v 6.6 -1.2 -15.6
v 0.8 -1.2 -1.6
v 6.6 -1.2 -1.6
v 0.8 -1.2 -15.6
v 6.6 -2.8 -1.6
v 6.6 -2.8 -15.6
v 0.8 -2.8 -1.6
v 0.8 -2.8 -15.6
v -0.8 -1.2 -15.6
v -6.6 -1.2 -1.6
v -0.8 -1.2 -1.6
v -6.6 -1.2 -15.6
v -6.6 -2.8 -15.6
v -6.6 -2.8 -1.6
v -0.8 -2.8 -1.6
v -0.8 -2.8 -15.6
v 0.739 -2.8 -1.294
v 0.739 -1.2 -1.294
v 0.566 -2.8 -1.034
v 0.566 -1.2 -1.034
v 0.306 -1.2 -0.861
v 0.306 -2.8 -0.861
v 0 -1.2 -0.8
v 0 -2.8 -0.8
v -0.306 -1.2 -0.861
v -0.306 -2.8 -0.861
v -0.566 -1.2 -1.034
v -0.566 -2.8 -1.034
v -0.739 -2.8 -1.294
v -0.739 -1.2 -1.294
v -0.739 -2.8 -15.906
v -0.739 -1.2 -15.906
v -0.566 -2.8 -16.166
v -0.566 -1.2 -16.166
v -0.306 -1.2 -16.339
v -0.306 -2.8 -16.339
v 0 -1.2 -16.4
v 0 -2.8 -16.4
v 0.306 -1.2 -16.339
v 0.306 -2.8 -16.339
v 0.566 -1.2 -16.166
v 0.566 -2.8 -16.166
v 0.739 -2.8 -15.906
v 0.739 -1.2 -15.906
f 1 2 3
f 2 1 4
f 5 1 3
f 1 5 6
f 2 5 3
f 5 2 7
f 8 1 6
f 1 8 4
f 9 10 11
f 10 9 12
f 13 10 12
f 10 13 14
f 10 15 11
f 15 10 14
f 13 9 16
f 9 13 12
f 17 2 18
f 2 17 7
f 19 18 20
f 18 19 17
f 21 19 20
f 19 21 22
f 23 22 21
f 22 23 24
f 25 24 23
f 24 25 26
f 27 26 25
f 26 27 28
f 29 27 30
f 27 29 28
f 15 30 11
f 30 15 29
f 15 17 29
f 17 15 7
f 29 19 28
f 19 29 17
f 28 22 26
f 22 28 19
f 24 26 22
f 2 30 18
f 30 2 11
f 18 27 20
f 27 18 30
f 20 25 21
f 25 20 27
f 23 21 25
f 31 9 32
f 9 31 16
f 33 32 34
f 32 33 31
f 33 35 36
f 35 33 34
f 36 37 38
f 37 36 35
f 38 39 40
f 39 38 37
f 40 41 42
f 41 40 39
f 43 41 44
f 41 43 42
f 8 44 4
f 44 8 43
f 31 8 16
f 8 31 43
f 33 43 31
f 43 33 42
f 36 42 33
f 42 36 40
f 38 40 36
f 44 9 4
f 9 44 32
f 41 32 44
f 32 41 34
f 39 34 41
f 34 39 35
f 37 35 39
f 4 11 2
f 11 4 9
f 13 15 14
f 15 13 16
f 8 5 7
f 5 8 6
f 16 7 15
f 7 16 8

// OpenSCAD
// file: ../p/4-4edge.scad
use <../lib.scad>
$fa=1; $fs=0.2;
function ldraw_lib__4_4edge(realsolid=false) = [
// 0 Circle 1.0
// 0 Name: 4-4edge.dat
// 0 Author: James Jessiman
// 0 !LDRAW_ORG Primitive UPDATE 2017-01
// 0 !LICENSE Licensed under CC BY 2.0 and CC BY 4.0 : see CAreadme.txt
// 
// 0 BFC CERTIFY CCW
  [0,"BFC","CERTIFY"],
  [0,"BFC","CCW"],
// 
// 0 !HISTORY 1998-12-15 [PTadmin] Official Update 1998-10
// 0 !HISTORY 2005-12-28 [PTadmin] Official Update 2005-01
// 0 !HISTORY 2007-06-24 [PTadmin] Header formatted for Contributor Agreement
// 0 !HISTORY 2008-07-01 [PTadmin] Official Update 2008-01
// 0 !HISTORY 2017-01-15 [Steffen] BFCed
// 0 !HISTORY 2017-12-30 [PTadmin] Official Update 2017-01
// 
// 
// 2 24 1 0 0 0.9239 0 0.3827
  [2,24,1,0,0,0.9239,0,0.3827],
// 2 24 0.9239 0 0.3827 0.7071 0 0.7071
  [2,24,0.9239,0,0.3827,0.7071,0,0.7071],
// 2 24 0.7071 0 0.7071 0.3827 0 0.9239
  [2,24,0.7071,0,0.7071,0.3827,0,0.9239],
// 2 24 0.3827 0 0.9239 0 0 1
  [2,24,0.3827,0,0.9239,0,0,1],
// 2 24 0 0 1 -0.3827 0 0.9239
  [2,24,0,0,1,-0.3827,0,0.9239],
// 2 24 -0.3827 0 0.9239 -0.7071 0 0.7071
  [2,24,-0.3827,0,0.9239,-0.7071,0,0.7071],
// 2 24 -0.7071 0 0.7071 -0.9239 0 0.3827
  [2,24,-0.7071,0,0.7071,-0.9239,0,0.3827],
// 2 24 -0.9239 0 0.3827 -1 0 -0
  [2,24,-0.9239,0,0.3827,-1,0,-0],
// 2 24 -1 0 -0 -0.9239 0 -0.3827
  [2,24,-1,0,-0,-0.9239,0,-0.3827],
// 2 24 -0.9239 0 -0.3827 -0.7071 0 -0.7071
  [2,24,-0.9239,0,-0.3827,-0.7071,0,-0.7071],
// 2 24 -0.7071 0 -0.7071 -0.3827 0 -0.9239
  [2,24,-0.7071,0,-0.7071,-0.3827,0,-0.9239],
// 2 24 -0.3827 0 -0.9239 0 0 -1
  [2,24,-0.3827,0,-0.9239,0,0,-1],
// 2 24 0 0 -1 0.3827 0 -0.9239
  [2,24,0,0,-1,0.3827,0,-0.9239],
// 2 24 0.3827 0 -0.9239 0.7071 0 -0.7071
  [2,24,0.3827,0,-0.9239,0.7071,0,-0.7071],
// 2 24 0.7071 0 -0.7071 0.9239 0 -0.3827
  [2,24,0.7071,0,-0.7071,0.9239,0,-0.3827],
// 2 24 0.9239 0 -0.3827 1 0 0
  [2,24,0.9239,0,-0.3827,1,0,0],
];
module ldraw_lib__4_4edge(step=0, col=false, unit=2/5, alt=false, line=0.2, solid=!$preview)
    makepoly(ldraw_lib__4_4edge(solid), step=step, col=col, unit=unit, alt=alt, line=line, solid=solid);
ldraw_lib__4_4edge(line=0.2);
// file: ../p/4-4disc.scad
use <../lib.scad>
$fa=1; $fs=0.2;
function ldraw_lib__4_4disc(realsolid=false) = [
// 0 Disc 1.0
// 0 Name: 4-4disc.dat
// 0 Author: James Jessiman
// 0 !LDRAW_ORG Primitive UPDATE 2002-02
// 0 !LICENSE Licensed under CC BY 2.0 and CC BY 4.0 : see CAreadme.txt
// 
// 0 BFC CERTIFY CCW
  [0,"BFC","CERTIFY"],
  [0,"BFC","CCW"],
// 
// 0 !HISTORY 1998-12-15 [PTadmin] Official Update 1998-10
// 0 !HISTORY 2002-03-23 [sbliss] Added BFC statement
// 0 !HISTORY 2002-04-25 [PTadmin] Official Update 2002-02
// 0 !HISTORY 2007-06-24 [PTadmin] Header formatted for Contributor Agreement
// 0 !HISTORY 2008-07-01 [PTadmin] Official Update 2008-01
// 
// 
// 3 16 0 0 0 1 0 0 0.9239 0 0.3827
  [3,16,0,0,0,1,0,0,0.9239,0,0.3827],
// 3 16 0 0 0 0.9239 0 0.3827 0.7071 0 0.7071
  [3,16,0,0,0,0.9239,0,0.3827,0.7071,0,0.7071],
// 3 16 0 0 0 0.7071 0 0.7071 0.3827 0 0.9239
  [3,16,0,0,0,0.7071,0,0.7071,0.3827,0,0.9239],
// 3 16 0 0 0 0.3827 0 0.9239 0 0 1
  [3,16,0,0,0,0.3827,0,0.9239,0,0,1],
// 3 16 0 0 0 0 0 1 -0.3827 0 0.9239
  [3,16,0,0,0,0,0,1,-0.3827,0,0.9239],
// 3 16 0 0 0 -0.3827 0 0.9239 -0.7071 0 0.7071
  [3,16,0,0,0,-0.3827,0,0.9239,-0.7071,0,0.7071],
// 3 16 0 0 0 -0.7071 0 0.7071 -0.9239 0 0.3827
  [3,16,0,0,0,-0.7071,0,0.7071,-0.9239,0,0.3827],
// 3 16 0 0 0 -0.9239 0 0.3827 -1 0 -0
  [3,16,0,0,0,-0.9239,0,0.3827,-1,0,-0],
// 3 16 0 0 0 -1 0 -0 -0.9239 0 -0.3827
  [3,16,0,0,0,-1,0,-0,-0.9239,0,-0.3827],
// 3 16 0 0 0 -0.9239 0 -0.3827 -0.7071 0 -0.7071
  [3,16,0,0,0,-0.9239,0,-0.3827,-0.7071,0,-0.7071],
// 3 16 0 0 0 -0.7071 0 -0.7071 -0.3827 0 -0.9239
  [3,16,0,0,0,-0.7071,0,-0.7071,-0.3827,0,-0.9239],
// 3 16 0 0 0 -0.3827 0 -0.9239 0 0 -1
  [3,16,0,0,0,-0.3827,0,-0.9239,0,0,-1],
// 3 16 0 0 0 0 0 -1 0.3827 0 -0.9239
  [3,16,0,0,0,0,0,-1,0.3827,0,-0.9239],
// 3 16 0 0 0 0.3827 0 -0.9239 0.7071 0 -0.7071
  [3,16,0,0,0,0.3827,0,-0.9239,0.7071,0,-0.7071],
// 3 16 0 0 0 0.7071 0 -0.7071 0.9239 0 -0.3827
  [3,16,0,0,0,0.7071,0,-0.7071,0.9239,0,-0.3827],
// 3 16 0 0 0 0.9239 0 -0.3827 1 0 0
  [3,16,0,0,0,0.9239,0,-0.3827,1,0,0],
// 0
];
module ldraw_lib__4_4disc(step=0, col=false, unit=2/5, alt=false, line=0.2, solid=!$preview)
    makepoly(ldraw_lib__4_4disc(solid), step=step, col=col, unit=unit, alt=alt, line=line, solid=solid);
ldraw_lib__4_4disc(line=0.2);
// file: ../p/4-4cyli.scad
use <../lib.scad>
$fa=1; $fs=0.2;
function ldraw_lib__4_4cyli(realsolid=false) = [
// 0 Cylinder 1.0
// 0 Name: 4-4cyli.dat
// 0 Author: James Jessiman
// 0 !LDRAW_ORG Primitive UPDATE 2005-01
// 0 !LICENSE Licensed under CC BY 2.0 and CC BY 4.0 : see CAreadme.txt
// 
// 0 BFC CERTIFY CCW
  [0,"BFC","CERTIFY"],
  [0,"BFC","CCW"],
// 
// 0 !HISTORY 1998-12-15 [PTadmin] Official Update 1998-10
// 0 !HISTORY 2002-03-23 [sbliss] Added BFC statement; merged headers from files in distributions LDraw 0.27 and Complete.
// 0 !HISTORY 2002-04-25 [PTadmin] Official Update 2002-02
// 0 !HISTORY 2004-12-14 [guyvivan] BFC CCW
// 0 !HISTORY 2005-12-28 [PTadmin] Official Update 2005-01
// 0 !HISTORY 2007-06-24 [PTadmin] Header formatted for Contributor Agreement
// 0 !HISTORY 2008-07-01 [PTadmin] Official Update 2008-01
// 
// 
// 4 16 1 1 0 0.9239 1 0.3827 0.9239 0 0.3827 1 0 0
  [4,16,1,1,0,0.9239,1,0.3827,0.9239,0,0.3827,1,0,0],
// 5 24 1 0 0 1 1 0 0.9239 0 0.3827 0.9239 0 -0.3827
  [5,24,1,0,0,1,1,0,0.9239,0,0.3827,0.9239,0,-0.3827],
// 4 16 0.9239 1 0.3827 0.7071 1 0.7071 0.7071 0 0.7071 0.9239 0 0.3827
  [4,16,0.9239,1,0.3827,0.7071,1,0.7071,0.7071,0,0.7071,0.9239,0,0.3827],
// 5 24 0.9239 0 0.3827 0.9239 1 0.3827 0.7071 0 0.7071 1 0 0
  [5,24,0.9239,0,0.3827,0.9239,1,0.3827,0.7071,0,0.7071,1,0,0],
// 4 16 0.7071 1 0.7071 0.3827 1 0.9239 0.3827 0 0.9239 0.7071 0 0.7071
  [4,16,0.7071,1,0.7071,0.3827,1,0.9239,0.3827,0,0.9239,0.7071,0,0.7071],
// 5 24 0.7071 0 0.7071 0.7071 1 0.7071 0.3827 0 0.9239 0.9239 0 0.3827
  [5,24,0.7071,0,0.7071,0.7071,1,0.7071,0.3827,0,0.9239,0.9239,0,0.3827],
// 4 16 0.3827 1 0.9239 0 1 1 0 0 1 0.3827 0 0.9239
  [4,16,0.3827,1,0.9239,0,1,1,0,0,1,0.3827,0,0.9239],
// 5 24 0.3827 0 0.9239 0.3827 1 0.9239 0 0 1 0.7071 0 0.7071
  [5,24,0.3827,0,0.9239,0.3827,1,0.9239,0,0,1,0.7071,0,0.7071],
// 4 16 0 1 1 -0.3827 1 0.9239 -0.3827 0 0.9239 0 0 1
  [4,16,0,1,1,-0.3827,1,0.9239,-0.3827,0,0.9239,0,0,1],
// 5 24 0 0 1 0 1 1 -0.3827 0 0.9239 0.3827 0 0.9239
  [5,24,0,0,1,0,1,1,-0.3827,0,0.9239,0.3827,0,0.9239],
// 4 16 -0.3827 1 0.9239 -0.7071 1 0.7071 -0.7071 0 0.7071 -0.3827 0 0.9239
  [4,16,-0.3827,1,0.9239,-0.7071,1,0.7071,-0.7071,0,0.7071,-0.3827,0,0.9239],
// 5 24 -0.3827 0 0.9239 -0.3827 1 0.9239 -0.7071 0 0.7071 0 0 1
  [5,24,-0.3827,0,0.9239,-0.3827,1,0.9239,-0.7071,0,0.7071,0,0,1],
// 4 16 -0.7071 1 0.7071 -0.9239 1 0.3827 -0.9239 0 0.3827 -0.7071 0 0.7071
  [4,16,-0.7071,1,0.7071,-0.9239,1,0.3827,-0.9239,0,0.3827,-0.7071,0,0.7071],
// 5 24 -0.7071 0 0.7071 -0.7071 1 0.7071 -0.9239 0 0.3827 -0.3827 0 0.9239
  [5,24,-0.7071,0,0.7071,-0.7071,1,0.7071,-0.9239,0,0.3827,-0.3827,0,0.9239],
// 4 16 -0.9239 1 0.3827 -1 1 0 -1 0 0 -0.9239 0 0.3827
  [4,16,-0.9239,1,0.3827,-1,1,0,-1,0,0,-0.9239,0,0.3827],
// 5 24 -0.9239 0 0.3827 -0.9239 1 0.3827 -1 0 0 -0.7071 0 0.7071
  [5,24,-0.9239,0,0.3827,-0.9239,1,0.3827,-1,0,0,-0.7071,0,0.7071],
// 4 16 -1 1 0 -0.9239 1 -0.3827 -0.9239 0 -0.3827 -1 0 0
  [4,16,-1,1,0,-0.9239,1,-0.3827,-0.9239,0,-0.3827,-1,0,0],
// 5 24 -1 0 0 -1 1 0 -0.9239 0 -0.3827 -0.9239 0 0.3827
  [5,24,-1,0,0,-1,1,0,-0.9239,0,-0.3827,-0.9239,0,0.3827],
// 4 16 -0.9239 1 -0.3827 -0.7071 1 -0.7071 -0.7071 0 -0.7071 -0.9239 0 -0.3827
  [4,16,-0.9239,1,-0.3827,-0.7071,1,-0.7071,-0.7071,0,-0.7071,-0.9239,0,-0.3827],
// 5 24 -0.9239 0 -0.3827 -0.9239 1 -0.3827 -0.7071 0 -0.7071 -1 0 0
  [5,24,-0.9239,0,-0.3827,-0.9239,1,-0.3827,-0.7071,0,-0.7071,-1,0,0],
// 4 16 -0.7071 1 -0.7071 -0.3827 1 -0.9239 -0.3827 0 -0.9239 -0.7071 0 -0.7071
  [4,16,-0.7071,1,-0.7071,-0.3827,1,-0.9239,-0.3827,0,-0.9239,-0.7071,0,-0.7071],
// 5 24 -0.7071 0 -0.7071 -0.7071 1 -0.7071 -0.3827 0 -0.9239 -0.9239 0 -0.3827
  [5,24,-0.7071,0,-0.7071,-0.7071,1,-0.7071,-0.3827,0,-0.9239,-0.9239,0,-0.3827],
// 4 16 -0.3827 1 -0.9239 0 1 -1 0 0 -1 -0.3827 0 -0.9239
  [4,16,-0.3827,1,-0.9239,0,1,-1,0,0,-1,-0.3827,0,-0.9239],
// 5 24 -0.3827 0 -0.9239 -0.3827 1 -0.9239 0 0 -1 -0.7071 0 -0.7071
  [5,24,-0.3827,0,-0.9239,-0.3827,1,-0.9239,0,0,-1,-0.7071,0,-0.7071],
// 4 16 0 1 -1 0.3827 1 -0.9239 0.3827 0 -0.9239 0 0 -1
  [4,16,0,1,-1,0.3827,1,-0.9239,0.3827,0,-0.9239,0,0,-1],
// 5 24 0 0 -1 0 1 -1 0.3827 0 -0.9239 -0.3827 0 -0.9239
  [5,24,0,0,-1,0,1,-1,0.3827,0,-0.9239,-0.3827,0,-0.9239],
// 4 16 0.3827 1 -0.9239 0.7071 1 -0.7071 0.7071 0 -0.7071 0.3827 0 -0.9239
  [4,16,0.3827,1,-0.9239,0.7071,1,-0.7071,0.7071,0,-0.7071,0.3827,0,-0.9239],
// 5 24 0.3827 0 -0.9239 0.3827 1 -0.9239 0.7071 0 -0.7071 0 0 -1
  [5,24,0.3827,0,-0.9239,0.3827,1,-0.9239,0.7071,0,-0.7071,0,0,-1],
// 4 16 0.7071 1 -0.7071 0.9239 1 -0.3827 0.9239 0 -0.3827 0.7071 0 -0.7071
  [4,16,0.7071,1,-0.7071,0.9239,1,-0.3827,0.9239,0,-0.3827,0.7071,0,-0.7071],
// 5 24 0.7071 0 -0.7071 0.7071 1 -0.7071 0.9239 0 -0.3827 0.3827 0 -0.9239
  [5,24,0.7071,0,-0.7071,0.7071,1,-0.7071,0.9239,0,-0.3827,0.3827,0,-0.9239],
// 4 16 0.9239 1 -0.3827 1 1 0 1 0 0 0.9239 0 -0.3827
  [4,16,0.9239,1,-0.3827,1,1,0,1,0,0,0.9239,0,-0.3827],
// 5 24 0.9239 0 -0.3827 0.9239 1 -0.3827 1 0 0 0.7071 0 -0.7071
  [5,24,0.9239,0,-0.3827,0.9239,1,-0.3827,1,0,0,0.7071,0,-0.7071],
// 0
];
module ldraw_lib__4_4cyli(step=0, col=false, unit=2/5, alt=false, line=0.2, solid=!$preview)
    makepoly(ldraw_lib__4_4cyli(solid), step=step, col=col, unit=unit, alt=alt, line=line, solid=solid);
ldraw_lib__4_4cyli(line=0.2);
// file: ../p/stud3.scad
use <../lib.scad>
use <4-4cyli.scad>
use <4-4disc.scad>
use <4-4edge.scad>
$fa=1; $fs=0.2;
function ldraw_lib__stud3(realsolid=false) = realsolid ? 
    [openscad(translate([0,0,-eps()], o=cylinder(4+eps(), r=4)),2)] : [
// 0 Stud Tube Solid
// 0 Name: stud3.dat
// 0 Author: James Jessiman
// 0 !LDRAW_ORG Primitive UPDATE 2012-01
// 0 !LICENSE Licensed under CC BY 2.0 and CC BY 4.0 : see CAreadme.txt
// 
// 0 BFC CERTIFY CCW
  [0,"BFC","CERTIFY"],
  [0,"BFC","CCW"],
// 
// 0 !HISTORY 2002-04-04 [sbliss] Modified for BFC compliance
// 0 !HISTORY 2002-04-25 [PTadmin] Official Update 2002-02
// 0 !HISTORY 2007-06-24 [PTadmin] Header formatted for Contributor Agreement
// 0 !HISTORY 2008-07-01 [PTadmin] Official Update 2008-01
// 0 !HISTORY 2012-02-16 [Philo] Changed to CCW
// 0 !HISTORY 2012-03-30 [PTadmin] Official Update 2012-01
// 
// 
// 1 16 0 -4 0 4 0 0 0 1 0 0 0 4 4-4edge.dat
  [1,16,0,-4,0,4,0,0,0,1,0,0,0,4, ldraw_lib__4_4edge(realsolid)],
// 1 16 0 0 0 4 0 0 0 1 0 0 0 4 4-4edge.dat
  [1,16,0,0,0,4,0,0,0,1,0,0,0,4, ldraw_lib__4_4edge(realsolid)],
// 1 16 0 -4 0 4 0 0 0 1 0 0 0 4 4-4disc.dat
  [1,16,0,-4,0,4,0,0,0,1,0,0,0,4, ldraw_lib__4_4disc(realsolid)],
// 1 16 0 -4 0 4 0 0 0 4 0 0 0 4 4-4cyli.dat
  [1,16,0,-4,0,4,0,0,0,4,0,0,0,4, ldraw_lib__4_4cyli(realsolid)],
];
module ldraw_lib__stud3(step=0, col=false, unit=2/5, alt=false, line=0.2, solid=!$preview)
    makepoly(ldraw_lib__stud3(solid), step=step, col=col, unit=unit, alt=alt, line=line, solid=solid);
ldraw_lib__stud3(line=0.2);
// file: ../p/stud.scad
use <../lib.scad>
use <4-4cyli.scad>
use <4-4disc.scad>
use <4-4edge.scad>
$fa=1; $fs=0.2;
function ldraw_lib__stud(realsolid=false) = realsolid ? 
    [openscad(translate([0,0,-eps()], o=cylinder(4+eps(), r=6)),2)] : [
// 0 Stud
// 0 Name: stud.dat
// 0 Author: James Jessiman
// 0 !LDRAW_ORG Primitive UPDATE 2012-01
// 0 !LICENSE Licensed under CC BY 2.0 and CC BY 4.0 : see CAreadme.txt
// 
// 0 BFC CERTIFY CCW
  [0,"BFC","CERTIFY"],
  [0,"BFC","CCW"],
// 
// 0 !HISTORY 2002-04-04 [sbliss] Modified for BFC compliance
// 0 !HISTORY 2002-04-25 [PTadmin] Official Update 2002-02
// 0 !HISTORY 2007-06-24 [PTadmin] Header formatted for Contributor Agreement
// 0 !HISTORY 2008-07-01 [PTadmin] Official Update 2008-01
// 0 !HISTORY 2012-02-16 [Philo] Changed to CCW
// 0 !HISTORY 2012-03-30 [PTadmin] Official Update 2012-01
// 
// 
// 1 16 0 0 0 6 0 0 0 1 0 0 0 6 4-4edge.dat
  [1,16,0,0,0,6,0,0,0,1,0,0,0,6, ldraw_lib__4_4edge(realsolid)],
// 1 16 0 -4 0 6 0 0 0 1 0 0 0 6 4-4edge.dat
  [1,16,0,-4,0,6,0,0,0,1,0,0,0,6, ldraw_lib__4_4edge(realsolid)],
// 1 16 0 0 0 6 0 0 0 -4 0 0 0 6 4-4cyli.dat
  [1,16,0,0,0,6,0,0,0,-4,0,0,0,6, ldraw_lib__4_4cyli(realsolid)],
// 1 16 0 -4 0 6 0 0 0 1 0 0 0 6 4-4disc.dat
  [1,16,0,-4,0,6,0,0,0,1,0,0,0,6, ldraw_lib__4_4disc(realsolid)],
];
module ldraw_lib__stud(step=0, col=false, unit=2/5, alt=false, line=0.2, solid=!$preview)
    makepoly(ldraw_lib__stud(solid), step=step, col=col, unit=unit, alt=alt, line=line, solid=solid);
ldraw_lib__stud(line=0.2);
// file: ../p/box5.scad
use <../lib.scad>
$fa=1; $fs=0.2;
function ldraw_lib__box5(realsolid=false) = [
// 0 Box with 5 Faces and All Edges
// 0 Name: box5.dat
// 0 Author: James Jessiman
// 0 !LDRAW_ORG Primitive UPDATE 2012-01
// 0 !LICENSE Licensed under CC BY 2.0 and CC BY 4.0 : see CAreadme.txt
// 
// 0 BFC CERTIFY CCW
  [0,"BFC","CERTIFY"],
  [0,"BFC","CCW"],
// 
// 0 !HISTORY 2002-04-03 [sbliss] Modified for BFC compliance
// 0 !HISTORY 2002-04-25 [PTadmin] Official Update 2002-02
// 0 !HISTORY 2007-06-24 [PTadmin] Header formatted for Contributor Agreement
// 0 !HISTORY 2008-07-01 [PTadmin] Official Update 2008-01
// 0 !HISTORY 2012-02-16 [Philo] Changed to CCW
// 0 !HISTORY 2012-03-30 [PTadmin] Official Update 2012-01
// 
// 
// 2 24 1 1 1 -1 1 1
  [2,24,1,1,1,-1,1,1],
// 2 24 -1 1 1 -1 1 -1
  [2,24,-1,1,1,-1,1,-1],
// 2 24 -1 1 -1 1 1 -1
  [2,24,-1,1,-1,1,1,-1],
// 2 24 1 1 -1 1 1 1
  [2,24,1,1,-1,1,1,1],
// 2 24 1 0 1 -1 0 1
  [2,24,1,0,1,-1,0,1],
// 2 24 -1 0 1 -1 0 -1
  [2,24,-1,0,1,-1,0,-1],
// 2 24 -1 0 -1 1 0 -1
  [2,24,-1,0,-1,1,0,-1],
// 2 24 1 0 -1 1 0 1
  [2,24,1,0,-1,1,0,1],
// 2 24 1 0 1 1 1 1
  [2,24,1,0,1,1,1,1],
// 2 24 -1 0 1 -1 1 1
  [2,24,-1,0,1,-1,1,1],
// 2 24 1 0 -1 1 1 -1
  [2,24,1,0,-1,1,1,-1],
// 2 24 -1 0 -1 -1 1 -1
  [2,24,-1,0,-1,-1,1,-1],
// 4 16 -1 1 1 1 1 1 1 1 -1 -1 1 -1
  [4,16,-1,1,1,1,1,1,1,1,-1,-1,1,-1],
// 4 16 -1 1 1 -1 0 1 1 0 1 1 1 1
  [4,16,-1,1,1,-1,0,1,1,0,1,1,1,1],
// 4 16 -1 1 -1 -1 0 -1 -1 0 1 -1 1 1
  [4,16,-1,1,-1,-1,0,-1,-1,0,1,-1,1,1],
// 4 16 1 1 -1 1 0 -1 -1 0 -1 -1 1 -1
  [4,16,1,1,-1,1,0,-1,-1,0,-1,-1,1,-1],
// 4 16 1 1 1 1 0 1 1 0 -1 1 1 -1
  [4,16,1,1,1,1,0,1,1,0,-1,1,1,-1],
];
module ldraw_lib__box5(step=0, col=false, unit=2/5, alt=false, line=0.2, solid=!$preview)
    makepoly(ldraw_lib__box5(solid), step=step, col=col, unit=unit, alt=alt, line=line, solid=solid);
ldraw_lib__box5(line=0.2);
// file: ../p/box4t.scad
use <../lib.scad>
$fa=1; $fs=0.2;
function ldraw_lib__box4t(realsolid=false) = [
// 0 Box with 4 Adjacent Faces and All Edges
// 0 Name: box4t.dat
// 0 Author: Tore Eriksson [Tore_Eriksson]
// 0 !LDRAW_ORG Primitive UPDATE 2003-02
// 0 !LICENSE Licensed under CC BY 2.0 and CC BY 4.0 : see CAreadme.txt
// 
// 0 BFC CERTIFY CCW
  [0,"BFC","CERTIFY"],
  [0,"BFC","CCW"],
// 
// 0 !HISTORY 1997-09-29 [PTadmin] Official Update 1997-15
// 0 !HISTORY 2002-08-31 [izanette] Modified with WINDZ for BFC compliance
// 0 !HISTORY 2003-08-01 [PTadmin] Official Update 2003-02
// 0 !HISTORY 2007-06-24 [PTadmin] Header formatted for Contributor Agreement
// 0 !HISTORY 2008-07-01 [PTadmin] Official Update 2008-01
// 
// 
// 2 24 1 1 1 -1 1 1
  [2,24,1,1,1,-1,1,1],
// 2 24 -1 1 1 -1 1 -1
  [2,24,-1,1,1,-1,1,-1],
// 2 24 -1 1 -1 1 1 -1
  [2,24,-1,1,-1,1,1,-1],
// 2 24 1 1 -1 1 1 1
  [2,24,1,1,-1,1,1,1],
// 2 24 1 0 1 -1 0 1
  [2,24,1,0,1,-1,0,1],
// 2 24 -1 0 1 -1 0 -1
  [2,24,-1,0,1,-1,0,-1],
// 2 24 -1 0 -1 1 0 -1
  [2,24,-1,0,-1,1,0,-1],
// 2 24 1 0 -1 1 0 1
  [2,24,1,0,-1,1,0,1],
// 2 24 1 0 1 1 1 1
  [2,24,1,0,1,1,1,1],
// 2 24 -1 0 1 -1 1 1
  [2,24,-1,0,1,-1,1,1],
// 2 24 1 0 -1 1 1 -1
  [2,24,1,0,-1,1,1,-1],
// 2 24 -1 0 -1 -1 1 -1
  [2,24,-1,0,-1,-1,1,-1],
// 4 16 1 1 1 1 1 -1 -1 1 -1 -1 1 1
  [4,16,1,1,1,1,1,-1,-1,1,-1,-1,1,1],
// 4 16 1 1 1 -1 1 1 -1 0 1 1 0 1
  [4,16,1,1,1,-1,1,1,-1,0,1,1,0,1],
// 4 16 -1 1 1 -1 1 -1 -1 0 -1 -1 0 1
  [4,16,-1,1,1,-1,1,-1,-1,0,-1,-1,0,1],
// 0 4 16 -1 1 -1 -1 0 -1 1 0 -1 1 1 -1
// 4 16 1 1 -1 1 1 1 1 0 1 1 0 -1
  [4,16,1,1,-1,1,1,1,1,0,1,1,0,-1],
// 0
];
module ldraw_lib__box4t(step=0, col=false, unit=2/5, alt=false, line=0.2, solid=!$preview)
    makepoly(ldraw_lib__box4t(solid), step=step, col=col, unit=unit, alt=alt, line=line, solid=solid);
ldraw_lib__box4t(line=0.2);
// file: ../p/2-4edge.scad
use <../lib.scad>
$fa=1; $fs=0.2;
function ldraw_lib__2_4edge(realsolid=false) = [
// 0 Circle 0.5
// 0 Name: 2-4edge.dat
// 0 Author: James Jessiman
// 0 !LDRAW_ORG Primitive UPDATE 2017-01
// 0 !LICENSE Licensed under CC BY 2.0 and CC BY 4.0 : see CAreadme.txt
// 
// 0 BFC CERTIFY CCW
  [0,"BFC","CERTIFY"],
  [0,"BFC","CCW"],
// 
// 0 !HISTORY 2007-06-24 [PTadmin] Header formatted for Contributor Agreement
// 0 !HISTORY 2008-07-01 [PTadmin] Official Update 2008-01
// 0 !HISTORY 2017-01-15 [Steffen] BFCed
// 0 !HISTORY 2017-12-30 [PTadmin] Official Update 2017-01
// 
// 
// 2 24 1 0 0 0.9239 0 0.3827
  [2,24,1,0,0,0.9239,0,0.3827],
// 2 24 0.9239 0 0.3827 0.7071 0 0.7071
  [2,24,0.9239,0,0.3827,0.7071,0,0.7071],
// 2 24 0.7071 0 0.7071 0.3827 0 0.9239
  [2,24,0.7071,0,0.7071,0.3827,0,0.9239],
// 2 24 0.3827 0 0.9239 0 0 1
  [2,24,0.3827,0,0.9239,0,0,1],
// 2 24 0 0 1 -0.3827 0 0.9239
  [2,24,0,0,1,-0.3827,0,0.9239],
// 2 24 -0.3827 0 0.9239 -0.7071 0 0.7071
  [2,24,-0.3827,0,0.9239,-0.7071,0,0.7071],
// 2 24 -0.7071 0 0.7071 -0.9239 0 0.3827
  [2,24,-0.7071,0,0.7071,-0.9239,0,0.3827],
// 2 24 -0.9239 0 0.3827 -1 0 0
  [2,24,-0.9239,0,0.3827,-1,0,0],
];
module ldraw_lib__2_4edge(step=0, col=false, unit=2/5, alt=false, line=0.2, solid=!$preview)
    makepoly(ldraw_lib__2_4edge(solid), step=step, col=col, unit=unit, alt=alt, line=line, solid=solid);
ldraw_lib__2_4edge(line=0.2);
// file: ../p/2-4cyli.scad
use <../lib.scad>
$fa=1; $fs=0.2;
function ldraw_lib__2_4cyli(realsolid=false) = [
// 0 Cylinder 0.5
// 0 Name: 2-4cyli.dat
// 0 Author: James Jessiman
// 0 !LDRAW_ORG Primitive UPDATE 2005-01
// 0 !LICENSE Licensed under CC BY 2.0 and CC BY 4.0 : see CAreadme.txt
// 
// 0 BFC CERTIFY CCW
  [0,"BFC","CERTIFY"],
  [0,"BFC","CCW"],
// 
// 0 !HISTORY 2002-03-23 [sbliss] Added BFC statement; compacted code
// 0 !HISTORY 2002-04-25 [PTadmin] Official Update 2002-02
// 0 !HISTORY 2004-12-11 [nielsk] Recreated using Primitive Generator, Edge lines fixed, BFC changed to CCW
// 0 !HISTORY 2005-12-28 [PTadmin] Official Update 2005-01
// 0 !HISTORY 2007-06-24 [PTadmin] Header formatted for Contributor Agreement
// 0 !HISTORY 2008-07-01 [PTadmin] Official Update 2008-01
// 
// 
// 4 16 .9239 1 .3827 .9239 0 .3827 1 0 0 1 1 0
  [4,16,.9239,1,.3827,.9239,0,.3827,1,0,0,1,1,0],
// 4 16 .7071 1 .7071 .7071 0 .7071 .9239 0 .3827 .9239 1 .3827
  [4,16,.7071,1,.7071,.7071,0,.7071,.9239,0,.3827,.9239,1,.3827],
// 4 16 .3827 1 .9239 .3827 0 .9239 .7071 0 .7071 .7071 1 .7071
  [4,16,.3827,1,.9239,.3827,0,.9239,.7071,0,.7071,.7071,1,.7071],
// 4 16 0 1 1 0 0 1 .3827 0 .9239 .3827 1 .9239
  [4,16,0,1,1,0,0,1,.3827,0,.9239,.3827,1,.9239],
// 4 16 -.3827 1 .9239 -.3827 0 .9239 0 0 1 0 1 1
  [4,16,-.3827,1,.9239,-.3827,0,.9239,0,0,1,0,1,1],
// 4 16 -.7071 1 .7071 -.7071 0 .7071 -.3827 0 .9239 -.3827 1 .9239
  [4,16,-.7071,1,.7071,-.7071,0,.7071,-.3827,0,.9239,-.3827,1,.9239],
// 4 16 -.9239 1 .3827 -.9239 0 .3827 -.7071 0 .7071 -.7071 1 .7071
  [4,16,-.9239,1,.3827,-.9239,0,.3827,-.7071,0,.7071,-.7071,1,.7071],
// 4 16 -1 1 0 -1 0 0 -.9239 0 .3827 -.9239 1 .3827
  [4,16,-1,1,0,-1,0,0,-.9239,0,.3827,-.9239,1,.3827],
// 5 24 1 1 0 1 0 0 1 1 -.4142 .9239 1 .3827
  [5,24,1,1,0,1,0,0,1,1,-.4142,.9239,1,.3827],
// 5 24 .9239 1 .3827 .9239 0 .3827 1 1 0 .7071 1 .7071
  [5,24,.9239,1,.3827,.9239,0,.3827,1,1,0,.7071,1,.7071],
// 5 24 .7071 1 .7071 .7071 0 .7071 .9239 1 .3827 .3827 1 .9239
  [5,24,.7071,1,.7071,.7071,0,.7071,.9239,1,.3827,.3827,1,.9239],
// 5 24 .3827 1 .9239 .3827 0 .9239 .7071 1 .7071 0 1 1
  [5,24,.3827,1,.9239,.3827,0,.9239,.7071,1,.7071,0,1,1],
// 5 24 0 1 1 0 0 1 .3827 1 .9239 -.3827 1 .9239
  [5,24,0,1,1,0,0,1,.3827,1,.9239,-.3827,1,.9239],
// 5 24 -.3827 1 .9239 -.3827 0 .9239 0 1 1 -.7071 1 .7071
  [5,24,-.3827,1,.9239,-.3827,0,.9239,0,1,1,-.7071,1,.7071],
// 5 24 -.7071 1 .7071 -.7071 0 .7071 -.3827 1 .9239 -.9239 1 .3827
  [5,24,-.7071,1,.7071,-.7071,0,.7071,-.3827,1,.9239,-.9239,1,.3827],
// 5 24 -.9239 1 .3827 -.9239 0 .3827 -.7071 1 .7071 -1 1 0
  [5,24,-.9239,1,.3827,-.9239,0,.3827,-.7071,1,.7071,-1,1,0],
// 5 24 -1 1 0 -1 0 0 -.9239 1 .3827 -1 1 -.4142
  [5,24,-1,1,0,-1,0,0,-.9239,1,.3827,-1,1,-.4142],
// 0
];
module ldraw_lib__2_4cyli(step=0, col=false, unit=2/5, alt=false, line=0.2, solid=!$preview)
    makepoly(ldraw_lib__2_4cyli(solid), step=step, col=col, unit=unit, alt=alt, line=line, solid=solid);
ldraw_lib__2_4cyli(line=0.2);
// file: s/3004s01.scad
use <../../lib.scad>
use <../../p/box4t.scad>
use <../../p/box5.scad>
use <../../p/stud.scad>
use <../../p/stud3.scad>
$fa=1; $fs=0.2;
function ldraw_lib__s__3004s01(realsolid=false) = [
// 0 ~Brick  1 x  2 without Front Face
// 0 Name: s\3004s01.dat
// 0 Author: James Jessiman
// 0 !LDRAW_ORG Subpart UPDATE 2003-03
// 0 !LICENSE Licensed under CC BY 2.0 and CC BY 4.0 : see CAreadme.txt
// 
// 0 BFC CERTIFY CCW
  [0,"BFC","CERTIFY"],
  [0,"BFC","CCW"],
// 
// 0 !HISTORY 2003-09-07 [jriley] Subfiling, BFC
// 0 !HISTORY 2003-12-19 [PTadmin] Official Update 2003-03
// 0 !HISTORY 2007-08-29 [PTadmin] Header formatted for Contributor Agreement
// 0 !HISTORY 2008-07-01 [PTadmin] Official Update 2008-01
// 
// 
// 1 16 0 4 0 1 0 0 0 -5 0 0 0 1 stud3.dat
  [1,16,0,4,0,1,0,0,0,-5,0,0,0,1, ldraw_lib__stud3(realsolid)],
// 0 BFC INVERTNEXT
  [0,"BFC","INVERTNEXT"],
// 1 16 0 24 0 16 0 0 0 -20 0 0 0 6 box5.dat
  [1,16,0,24,0,16,0,0,0,-20,0,0,0,6, ldraw_lib__box5(realsolid)],
// 4 16 20 24 10 16 24 6 -16 24 6 -20 24 10
  [4,16,20,24,10,16,24,6,-16,24,6,-20,24,10],
// 4 16 -20 24 10 -16 24 6 -16 24 -6 -20 24 -10
  [4,16,-20,24,10,-16,24,6,-16,24,-6,-20,24,-10],
// 4 16 -20 24 -10 -16 24 -6 16 24 -6 20 24 -10
  [4,16,-20,24,-10,-16,24,-6,16,24,-6,20,24,-10],
// 4 16 20 24 -10 16 24 -6 16 24 6 20 24 10
  [4,16,20,24,-10,16,24,-6,16,24,6,20,24,10],
// 1 16 0 24 0 20 0 0 0 -24 0 0 0 10 box4t.dat
  [1,16,0,24,0,20,0,0,0,-24,0,0,0,10, ldraw_lib__box4t(realsolid)],
// 1 16 10 0 0 1 0 0 0 1 0 0 0 1 stud.dat
  [1,16,10,0,0,1,0,0,0,1,0,0,0,1, ldraw_lib__stud(realsolid)],
// 1 16 -10 0 0 1 0 0 0 1 0 0 0 1 stud.dat
  [1,16,-10,0,0,1,0,0,0,1,0,0,0,1, ldraw_lib__stud(realsolid)],
// 0
];
module ldraw_lib__s__3004s01(step=0, col=false, unit=2/5, alt=false, line=0.2, solid=!$preview)
    makepoly(ldraw_lib__s__3004s01(solid), step=step, col=col, unit=unit, alt=alt, line=line, solid=solid);
ldraw_lib__s__3004s01(line=0.2);
// file: ../p/box4-4a.scad
use <../lib.scad>
$fa=1; $fs=0.2;
function ldraw_lib__box4_4a(realsolid=false) = [
// 0 Box with 4 Faces without 4 Adjacent Edges
// 0 Name: box4-4a.dat
// 0 Author: Manfred Moolhuysen
// 0 !LDRAW_ORG Primitive UPDATE 2012-01
// 0 !LICENSE Licensed under CC BY 2.0 and CC BY 4.0 : see CAreadme.txt
// 
// 0 BFC CERTIFY CCW
  [0,"BFC","CERTIFY"],
  [0,"BFC","CCW"],
// 
// 0 !HISTORY 1998-07-15 [PTadmin] Official Update 1998-07
// 0 !HISTORY 2002-12-13 [hafhead] Made BFC compliant
// 0 !HISTORY 2003-03-12 [PTadmin] Official Update 2003-01
// 0 !HISTORY 2007-06-24 [PTadmin] Header formatted for Contributor Agreement
// 0 !HISTORY 2008-07-01 [PTadmin] Official Update 2008-01
// 0 !HISTORY 2012-02-16 [Philo] Changed to CCW
// 0 !HISTORY 2012-03-30 [PTadmin] Official Update 2012-01
// 
// 
// 2 24 1 1 1 -1 1 1
  [2,24,1,1,1,-1,1,1],
// 2 24 -1 1 1 -1 1 -1
  [2,24,-1,1,1,-1,1,-1],
// 2 24 1 1 -1 1 1 1
  [2,24,1,1,-1,1,1,1],
// 2 24 1 0 1 -1 0 1
  [2,24,1,0,1,-1,0,1],
// 2 24 -1 0 1 -1 0 -1
  [2,24,-1,0,1,-1,0,-1],
// 2 24 1 0 -1 1 0 1
  [2,24,1,0,-1,1,0,1],
// 2 24 1 0 1 1 1 1
  [2,24,1,0,1,1,1,1],
// 2 24 -1 0 1 -1 1 1
  [2,24,-1,0,1,-1,1,1],
// 4 16 1 1 -1 -1 1 -1 -1 1 1 1 1 1
  [4,16,1,1,-1,-1,1,-1,-1,1,1,1,1,1],
// 4 16 -1 1 1 -1 0 1 1 0 1 1 1 1
  [4,16,-1,1,1,-1,0,1,1,0,1,1,1,1],
// 4 16 -1 1 -1 -1 0 -1 -1 0 1 -1 1 1
  [4,16,-1,1,-1,-1,0,-1,-1,0,1,-1,1,1],
// 4 16 1 1 1 1 0 1 1 0 -1 1 1 -1
  [4,16,1,1,1,1,0,1,1,0,-1,1,1,-1],
];
module ldraw_lib__box4_4a(step=0, col=false, unit=2/5, alt=false, line=0.2, solid=!$preview)
    makepoly(ldraw_lib__box4_4a(solid), step=step, col=col, unit=unit, alt=alt, line=line, solid=solid);
ldraw_lib__box4_4a(line=0.2);
// file: ../p/2-4cylo.scad
use <../lib.scad>
use <2-4cyli.scad>
use <2-4edge.scad>
$fa=1; $fs=0.2;
function ldraw_lib__2_4cylo(realsolid=false) = [
// 0 Cylinder Open 0.5
// 0 Name: 2-4cylo.dat
// 0 Author: Max Martin Richter [MMR1988]
// 0 !LDRAW_ORG Primitive UPDATE 2010-03
// 0 !LICENSE Licensed under CC BY 2.0 and CC BY 4.0 : see CAreadme.txt
// 
// 0 BFC CERTIFY CCW
  [0,"BFC","CERTIFY"],
  [0,"BFC","CCW"],
// 
// 0 !HISTORY 2010-12-31 [PTadmin] Official Update 2010-03
// 
// 
// 1 16 0 0 0 1 0 0 0 1 0 0 0 1 2-4edge.dat
  [1,16,0,0,0,1,0,0,0,1,0,0,0,1, ldraw_lib__2_4edge(realsolid)],
// 1 16 0 1 0 1 0 0 0 1 0 0 0 1 2-4edge.dat
  [1,16,0,1,0,1,0,0,0,1,0,0,0,1, ldraw_lib__2_4edge(realsolid)],
// 1 16 0 0 0 1 0 0 0 1 0 0 0 1 2-4cyli.dat
  [1,16,0,0,0,1,0,0,0,1,0,0,0,1, ldraw_lib__2_4cyli(realsolid)],
];
module ldraw_lib__2_4cylo(step=0, col=false, unit=2/5, alt=false, line=0.2, solid=!$preview)
    makepoly(ldraw_lib__2_4cylo(solid), step=step, col=col, unit=unit, alt=alt, line=line, solid=solid);
ldraw_lib__2_4cylo(line=0.2);
// file: ../p/2-4chrd.scad
use <../lib.scad>
$fa=1; $fs=0.2;
function ldraw_lib__2_4chrd(realsolid=false) = [
// 0 Chord 0.5
// 0 Name: 2-4chrd.dat
// 0 Author: Philippe Hurbain [Philo]
// 0 !LDRAW_ORG Primitive UPDATE 2014-01
// 0 !LICENSE Licensed under CC BY 2.0 and CC BY 4.0 : see CAreadme.txt
// 
// 0 BFC CERTIFY CCW
  [0,"BFC","CERTIFY"],
  [0,"BFC","CCW"],
// 
// 0 !HISTORY 2014-06-21 [PTadmin] Official Update 2014-01
// 
// 
// 4 16 0.9239 0 0.3827 -0.9239 0 0.3827 -1 0 0 1 0 0
  [4,16,0.9239,0,0.3827,-0.9239,0,0.3827,-1,0,0,1,0,0],
// 4 16 0.7071 0 0.7071 -0.7071 0 0.7071 -0.9239 0 0.3827 0.9239 0 0.3827
  [4,16,0.7071,0,0.7071,-0.7071,0,0.7071,-0.9239,0,0.3827,0.9239,0,0.3827],
// 4 16 0.3827 0 0.9239 -0.3827 0 0.9239 -0.7071 0 0.7071 0.7071 0 0.7071
  [4,16,0.3827,0,0.9239,-0.3827,0,0.9239,-0.7071,0,0.7071,0.7071,0,0.7071],
// 3 16 0 0 1 -0.3827 0 0.9239 0.3827 0 0.9239
  [3,16,0,0,1,-0.3827,0,0.9239,0.3827,0,0.9239],
];
module ldraw_lib__2_4chrd(step=0, col=false, unit=2/5, alt=false, line=0.2, solid=!$preview)
    makepoly(ldraw_lib__2_4chrd(solid), step=step, col=col, unit=unit, alt=alt, line=line, solid=solid);
ldraw_lib__2_4chrd(line=0.2);
// file: 3004.scad
use <../lib.scad>
use <s/3004s01.scad>
$fa=1; $fs=0.2;
function ldraw_lib__3004(realsolid=false) = [
// 0 Brick  1 x  2
// 0 Name: 3004.dat
// 0 Author: James Jessiman
// 0 !LDRAW_ORG Part UPDATE 2022-05
// 0 !LICENSE Licensed under CC BY 2.0 and CC BY 4.0 : see CAreadme.txt
// 
// 0 BFC CERTIFY CCW
  [0,"BFC","CERTIFY"],
  [0,"BFC","CCW"],
// 
// 0 !HISTORY 2001-10-26 [PTadmin] Official Update 2001-01
// 0 !HISTORY 2002-05-07 {unknown} BFC Certification
// 0 !HISTORY 2002-06-11 [PTadmin] Official Update 2002-03
// 0 !HISTORY 2007-05-07 [PTadmin] Header formatted for Contributor Agreement
// 0 !HISTORY 2008-07-01 [PTadmin] Official Update 2008-01
// 0 !HISTORY 2022-08-04 [MagFors] Using subfile
// 0 !HISTORY 2022-09-15 [PTadmin] Official Update 2022-05
// 
// 
// 1 16 0 0 0 1 0 0 0 1 0 0 0 1 s\3004s01.dat
  [1,16,0,0,0,1,0,0,0,1,0,0,0,1, ldraw_lib__s__3004s01(realsolid)],
// 4 16 -20 24 -10 20 24 -10 20 0 -10 -20 0 -10
  [4,16,-20,24,-10,20,24,-10,20,0,-10,-20,0,-10],
];
module ldraw_lib__3004(step=0, col=false, unit=2/5, alt=false, line=0.2, solid=!$preview)
    makepoly(ldraw_lib__3004(solid), step=step, col=col, unit=unit, alt=alt, line=line, solid=solid);
ldraw_lib__3004(line=0.2);
// file: s/60601s01.scad
use <../../lib.scad>
use <../../p/2-4chrd.scad>
use <../../p/2-4cylo.scad>
use <../../p/box4-4a.scad>
$fa=1; $fs=0.2;
function ldraw_lib__s__60601s01(realsolid=false) = [
// 0 ~Glass for Window  1 x  2 x  2 without Front Surface
// 0 Name: s\60601s01.dat
// 0 Author: Ulrich Röder [UR]
// 0 !LDRAW_ORG Subpart UPDATE 2019-01
// 0 !LICENSE Licensed under CC BY 2.0 and CC BY 4.0 : see CAreadme.txt
// 
// 0 BFC CERTIFY CCW
  [0,"BFC","CERTIFY"],
  [0,"BFC","CCW"],
// 
// 0 !HISTORY 2019-06-28 [PTadmin] Official Update 2019-01
// 
// 
// 1 16 9.25 21.5 -7 0 0 7.25 17.5 0 0 0 4 0 box4-4a.dat
  [1,16,9.25,21.5,-7,0,0,7.25,17.5,0,0,0,4,0, ldraw_lib__box4_4a(realsolid)],
// 1 16 -9.25 21.5 -7 0 0 -7.25 17.5 0 0 0 4 0 box4-4a.dat
  [1,16,-9.25,21.5,-7,0,0,-7.25,17.5,0,0,0,4,0, ldraw_lib__box4_4a(realsolid)],
// 1 16 0 4 -7 2 0 0 0 0 -2 0 4 0 2-4cylo.dat
  [1,16,0,4,-7,2,0,0,0,0,-2,0,4,0, ldraw_lib__2_4cylo(realsolid)],
// 1 16 0 4 -7 2 0 0 0 0 -2 0 1 0 2-4chrd.dat
  [1,16,0,4,-7,2,0,0,0,0,-2,0,1,0, ldraw_lib__2_4chrd(realsolid)],
// 1 16 0 4 -3 -2 0 0 0 0 -2 0 -1 0 2-4chrd.dat
  [1,16,0,4,-3,-2,0,0,0,0,-2,0,-1,0, ldraw_lib__2_4chrd(realsolid)],
// 1 16 0 39 -7 -2 0 0 0 0 2 0 4 0 2-4cylo.dat
  [1,16,0,39,-7,-2,0,0,0,0,2,0,4,0, ldraw_lib__2_4cylo(realsolid)],
// 1 16 0 39 -7 -2 0 0 0 0 2 0 1 0 2-4chrd.dat
  [1,16,0,39,-7,-2,0,0,0,0,2,0,1,0, ldraw_lib__2_4chrd(realsolid)],
// 1 16 0 39 -3 2 0 0 0 0 2 0 -1 0 2-4chrd.dat
  [1,16,0,39,-3,2,0,0,0,0,2,0,-1,0, ldraw_lib__2_4chrd(realsolid)],
// 4 16 -2 4 -3 2 4 -3 2 39 -3 -2 39 -3
  [4,16,-2,4,-3,2,4,-3,2,39,-3,-2,39,-3],
// 2 24 2 4 -3 2 4 -7
  [2,24,2,4,-3,2,4,-7],
// 2 24 -2 4 -3 -2 4 -7
  [2,24,-2,4,-3,-2,4,-7],
// 2 24 2 39 -3 2 39 -7
  [2,24,2,39,-3,2,39,-7],
// 2 24 -2 39 -3 -2 39 -7
  [2,24,-2,39,-3,-2,39,-7],
];
module ldraw_lib__s__60601s01(step=0, col=false, unit=2/5, alt=false, line=0.2, solid=!$preview)
    makepoly(ldraw_lib__s__60601s01(solid), step=step, col=col, unit=unit, alt=alt, line=line, solid=solid);
ldraw_lib__s__60601s01(line=0.2);
// main file
use <../lib.scad>
use <s/60601s01.scad>
$fa=1; $fs=0.2;
function ldraw_lib__60601(realsolid=false) = [
// 0 Glass for Window  1 x  2 x  2 without Sill
// 0 Name: 60601.dat
// 0 Author: Michael Heidemann [mikeheide]
// 0 !LDRAW_ORG Part UPDATE 2019-01
// 0 !LICENSE Licensed under CC BY 2.0 and CC BY 4.0 : see CAreadme.txt
// 
// 0 BFC CERTIFY CCW
  [0,"BFC","CERTIFY"],
  [0,"BFC","CCW"],
// 
// 0 !HISTORY 2010-12-31 [PTadmin] Official Update 2010-03
// 0 !HISTORY 2012-03-06 [gregteft] Updated to increase primitive use and correct inset for glass.
// 0 !HISTORY 2012-03-30 [PTadmin] Official Update 2012-01
// 0 !HISTORY 2018-10-02 [UR] Updated to insert Subfile
// 0 !HISTORY 2019-06-28 [PTadmin] Official Update 2019-01
// 
// 
// 1 16 0 0 0 1 -0 0 0 1 0 0 0 1 s\60601s01.dat
  [1,16,0,0,0,1,-0,0,0,1,0,0,0,1, ldraw_lib__s__60601s01(realsolid)],
// 4 16 -2 39 -7 -2 4 -7 -16.5 4 -7 -16.5 39 -7
  [4,16,-2,39,-7,-2,4,-7,-16.5,4,-7,-16.5,39,-7],
// 4 16 2 4 -7 2 39 -7 16.5 39 -7 16.5 4 -7
  [4,16,2,4,-7,2,39,-7,16.5,39,-7,16.5,4,-7],
// 4 16 2 4 -7 -2 4 -7 -2 39 -7 2 39 -7
  [4,16,2,4,-7,-2,4,-7,-2,39,-7,2,39,-7],
];
module ldraw_lib__60601(step=0, col=false, unit=2/5, alt=false, line=0.2, solid=!$preview)
    makepoly(ldraw_lib__60601(solid), step=step, col=col, unit=unit, alt=alt, line=line, solid=solid);
ldraw_lib__60601(line=0.2);
